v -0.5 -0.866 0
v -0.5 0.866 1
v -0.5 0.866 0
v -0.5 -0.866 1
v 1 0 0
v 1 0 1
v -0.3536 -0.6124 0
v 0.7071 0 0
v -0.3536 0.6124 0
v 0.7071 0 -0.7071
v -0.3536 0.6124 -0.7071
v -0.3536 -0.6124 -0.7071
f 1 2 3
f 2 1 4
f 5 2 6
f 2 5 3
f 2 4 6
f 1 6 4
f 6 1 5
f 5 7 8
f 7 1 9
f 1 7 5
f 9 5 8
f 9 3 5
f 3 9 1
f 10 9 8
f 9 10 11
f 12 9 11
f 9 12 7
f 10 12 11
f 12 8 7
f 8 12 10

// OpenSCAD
cube(1/0);
cube([0,0,1/0]);
cylinder(h=10, r=1/0);
cylinder(h=10, r1=1, r2=1/0);
cylinder(h=1/0);
sphere(1/0);
polygon([[0,0,0],[1,0,0],[1,1/0,0]]);
polyhedron(points = [[1/0,0,0],[-1,0,0],[0,1,0],[0,-1,0],[0,0,1],[0,0,-1]],
    triangles = [[0,4,2],[0,2,5],[0,3,4],[0,5,3],[1,2,4],[1,5,2],[1,4,3], [1,3,5]]);

cylinder($fn=1/0);
sphere($fn=1/0);
